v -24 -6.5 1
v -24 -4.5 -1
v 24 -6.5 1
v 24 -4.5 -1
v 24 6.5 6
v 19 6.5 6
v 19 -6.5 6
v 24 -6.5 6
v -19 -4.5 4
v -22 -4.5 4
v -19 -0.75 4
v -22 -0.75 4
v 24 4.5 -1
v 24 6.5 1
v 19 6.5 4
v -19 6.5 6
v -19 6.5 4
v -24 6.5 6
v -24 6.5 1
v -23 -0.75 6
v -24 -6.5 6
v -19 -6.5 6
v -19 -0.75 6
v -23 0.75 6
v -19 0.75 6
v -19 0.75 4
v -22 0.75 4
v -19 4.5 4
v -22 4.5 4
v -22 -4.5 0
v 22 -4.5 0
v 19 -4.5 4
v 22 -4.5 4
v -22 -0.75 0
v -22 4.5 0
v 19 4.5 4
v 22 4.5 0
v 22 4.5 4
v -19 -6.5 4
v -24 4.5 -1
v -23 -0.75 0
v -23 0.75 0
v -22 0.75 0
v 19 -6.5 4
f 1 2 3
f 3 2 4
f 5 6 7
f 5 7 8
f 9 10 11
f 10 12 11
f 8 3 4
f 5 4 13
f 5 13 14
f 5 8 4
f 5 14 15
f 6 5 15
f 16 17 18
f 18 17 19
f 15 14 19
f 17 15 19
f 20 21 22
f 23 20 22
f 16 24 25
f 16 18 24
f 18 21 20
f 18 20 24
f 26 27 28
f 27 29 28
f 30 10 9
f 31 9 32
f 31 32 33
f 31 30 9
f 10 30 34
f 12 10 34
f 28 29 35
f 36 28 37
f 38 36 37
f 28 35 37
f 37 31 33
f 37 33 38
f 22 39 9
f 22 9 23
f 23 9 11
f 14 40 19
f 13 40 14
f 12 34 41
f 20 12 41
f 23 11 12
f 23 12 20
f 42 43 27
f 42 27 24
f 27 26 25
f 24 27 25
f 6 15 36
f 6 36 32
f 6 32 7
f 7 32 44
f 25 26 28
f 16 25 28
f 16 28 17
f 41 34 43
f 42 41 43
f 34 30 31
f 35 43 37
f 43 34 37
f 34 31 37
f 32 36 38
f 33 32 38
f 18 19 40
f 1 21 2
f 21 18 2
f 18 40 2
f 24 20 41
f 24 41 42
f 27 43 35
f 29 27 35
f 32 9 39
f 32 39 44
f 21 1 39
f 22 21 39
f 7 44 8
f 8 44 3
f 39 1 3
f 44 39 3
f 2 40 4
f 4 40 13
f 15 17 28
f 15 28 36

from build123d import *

# Parameters (mm, degrees)
F0_W     = 48
F0_H     = 13
F0_W_2   = 44
F0_H_2   = 9
F1_DEPTH = 4
F2_DEPTH = 1
F3_W     = 3
F3_H     = 9
F4_DEPTH = 2
F5_SIZE  = 2
F6_W     = 1.5
F6_H     = 6
F7_DEPTH = 4


with BuildPart() as f1:
    # F0 (on Top) → F1 (new body)
    with BuildSketch(Plane.XY):
        Rectangle(F0_W, F0_H)
        Rectangle(F0_W_2, F0_H_2, mode=Mode.SUBTRACT)
    extrude(amount=F1_DEPTH)

    # F0 (on Top) → F2 (join)
    with BuildSketch(Plane.XY):
        Rectangle(F0_W, F0_H)
        Rectangle(F0_W_2, F0_H_2, mode=Mode.SUBTRACT)
        Rectangle(F0_W_2, F0_H_2)
    extrude(amount=-F2_DEPTH)

    # F3 (on face) → F4 (join)
    with BuildSketch(Plane.XY.offset(4)):
        Polygon((-19, 4.5), (-19, 6.5), (-24, 6.5), (-24, -6.5), (-19, -6.5), (-19, -4.5), (-22, -4.5), (-22, 4.5), align=None)
        with Locations((-20.5, 0)):
            Rectangle(F3_W, F3_H)
        Polygon((24, 6.5), (19, 6.5), (19, 4.5), (22, 4.5), (22, -4.5), (19, -4.5), (19, -6.5), (24, -6.5), align=None)
        with Locations((20.5, 0)):
            Rectangle(F3_W, F3_H)
    extrude(amount=F4_DEPTH)

    # F5
    f5_edges = [f1.edges().sort_by_distance(p)[0] for p in [
        (0, -6.5, -1),
        (0, 6.5, -1),
    ]]
    chamfer(f5_edges, length=F5_SIZE)

    # F6 (on face) → F7 (cut)
    with BuildSketch(Plane.YZ.offset(-19)):
        with Locations((0, 3)):
            Rectangle(F6_W, F6_H)
    extrude(amount=-F7_DEPTH, mode=Mode.SUBTRACT)


solid = f1.part
